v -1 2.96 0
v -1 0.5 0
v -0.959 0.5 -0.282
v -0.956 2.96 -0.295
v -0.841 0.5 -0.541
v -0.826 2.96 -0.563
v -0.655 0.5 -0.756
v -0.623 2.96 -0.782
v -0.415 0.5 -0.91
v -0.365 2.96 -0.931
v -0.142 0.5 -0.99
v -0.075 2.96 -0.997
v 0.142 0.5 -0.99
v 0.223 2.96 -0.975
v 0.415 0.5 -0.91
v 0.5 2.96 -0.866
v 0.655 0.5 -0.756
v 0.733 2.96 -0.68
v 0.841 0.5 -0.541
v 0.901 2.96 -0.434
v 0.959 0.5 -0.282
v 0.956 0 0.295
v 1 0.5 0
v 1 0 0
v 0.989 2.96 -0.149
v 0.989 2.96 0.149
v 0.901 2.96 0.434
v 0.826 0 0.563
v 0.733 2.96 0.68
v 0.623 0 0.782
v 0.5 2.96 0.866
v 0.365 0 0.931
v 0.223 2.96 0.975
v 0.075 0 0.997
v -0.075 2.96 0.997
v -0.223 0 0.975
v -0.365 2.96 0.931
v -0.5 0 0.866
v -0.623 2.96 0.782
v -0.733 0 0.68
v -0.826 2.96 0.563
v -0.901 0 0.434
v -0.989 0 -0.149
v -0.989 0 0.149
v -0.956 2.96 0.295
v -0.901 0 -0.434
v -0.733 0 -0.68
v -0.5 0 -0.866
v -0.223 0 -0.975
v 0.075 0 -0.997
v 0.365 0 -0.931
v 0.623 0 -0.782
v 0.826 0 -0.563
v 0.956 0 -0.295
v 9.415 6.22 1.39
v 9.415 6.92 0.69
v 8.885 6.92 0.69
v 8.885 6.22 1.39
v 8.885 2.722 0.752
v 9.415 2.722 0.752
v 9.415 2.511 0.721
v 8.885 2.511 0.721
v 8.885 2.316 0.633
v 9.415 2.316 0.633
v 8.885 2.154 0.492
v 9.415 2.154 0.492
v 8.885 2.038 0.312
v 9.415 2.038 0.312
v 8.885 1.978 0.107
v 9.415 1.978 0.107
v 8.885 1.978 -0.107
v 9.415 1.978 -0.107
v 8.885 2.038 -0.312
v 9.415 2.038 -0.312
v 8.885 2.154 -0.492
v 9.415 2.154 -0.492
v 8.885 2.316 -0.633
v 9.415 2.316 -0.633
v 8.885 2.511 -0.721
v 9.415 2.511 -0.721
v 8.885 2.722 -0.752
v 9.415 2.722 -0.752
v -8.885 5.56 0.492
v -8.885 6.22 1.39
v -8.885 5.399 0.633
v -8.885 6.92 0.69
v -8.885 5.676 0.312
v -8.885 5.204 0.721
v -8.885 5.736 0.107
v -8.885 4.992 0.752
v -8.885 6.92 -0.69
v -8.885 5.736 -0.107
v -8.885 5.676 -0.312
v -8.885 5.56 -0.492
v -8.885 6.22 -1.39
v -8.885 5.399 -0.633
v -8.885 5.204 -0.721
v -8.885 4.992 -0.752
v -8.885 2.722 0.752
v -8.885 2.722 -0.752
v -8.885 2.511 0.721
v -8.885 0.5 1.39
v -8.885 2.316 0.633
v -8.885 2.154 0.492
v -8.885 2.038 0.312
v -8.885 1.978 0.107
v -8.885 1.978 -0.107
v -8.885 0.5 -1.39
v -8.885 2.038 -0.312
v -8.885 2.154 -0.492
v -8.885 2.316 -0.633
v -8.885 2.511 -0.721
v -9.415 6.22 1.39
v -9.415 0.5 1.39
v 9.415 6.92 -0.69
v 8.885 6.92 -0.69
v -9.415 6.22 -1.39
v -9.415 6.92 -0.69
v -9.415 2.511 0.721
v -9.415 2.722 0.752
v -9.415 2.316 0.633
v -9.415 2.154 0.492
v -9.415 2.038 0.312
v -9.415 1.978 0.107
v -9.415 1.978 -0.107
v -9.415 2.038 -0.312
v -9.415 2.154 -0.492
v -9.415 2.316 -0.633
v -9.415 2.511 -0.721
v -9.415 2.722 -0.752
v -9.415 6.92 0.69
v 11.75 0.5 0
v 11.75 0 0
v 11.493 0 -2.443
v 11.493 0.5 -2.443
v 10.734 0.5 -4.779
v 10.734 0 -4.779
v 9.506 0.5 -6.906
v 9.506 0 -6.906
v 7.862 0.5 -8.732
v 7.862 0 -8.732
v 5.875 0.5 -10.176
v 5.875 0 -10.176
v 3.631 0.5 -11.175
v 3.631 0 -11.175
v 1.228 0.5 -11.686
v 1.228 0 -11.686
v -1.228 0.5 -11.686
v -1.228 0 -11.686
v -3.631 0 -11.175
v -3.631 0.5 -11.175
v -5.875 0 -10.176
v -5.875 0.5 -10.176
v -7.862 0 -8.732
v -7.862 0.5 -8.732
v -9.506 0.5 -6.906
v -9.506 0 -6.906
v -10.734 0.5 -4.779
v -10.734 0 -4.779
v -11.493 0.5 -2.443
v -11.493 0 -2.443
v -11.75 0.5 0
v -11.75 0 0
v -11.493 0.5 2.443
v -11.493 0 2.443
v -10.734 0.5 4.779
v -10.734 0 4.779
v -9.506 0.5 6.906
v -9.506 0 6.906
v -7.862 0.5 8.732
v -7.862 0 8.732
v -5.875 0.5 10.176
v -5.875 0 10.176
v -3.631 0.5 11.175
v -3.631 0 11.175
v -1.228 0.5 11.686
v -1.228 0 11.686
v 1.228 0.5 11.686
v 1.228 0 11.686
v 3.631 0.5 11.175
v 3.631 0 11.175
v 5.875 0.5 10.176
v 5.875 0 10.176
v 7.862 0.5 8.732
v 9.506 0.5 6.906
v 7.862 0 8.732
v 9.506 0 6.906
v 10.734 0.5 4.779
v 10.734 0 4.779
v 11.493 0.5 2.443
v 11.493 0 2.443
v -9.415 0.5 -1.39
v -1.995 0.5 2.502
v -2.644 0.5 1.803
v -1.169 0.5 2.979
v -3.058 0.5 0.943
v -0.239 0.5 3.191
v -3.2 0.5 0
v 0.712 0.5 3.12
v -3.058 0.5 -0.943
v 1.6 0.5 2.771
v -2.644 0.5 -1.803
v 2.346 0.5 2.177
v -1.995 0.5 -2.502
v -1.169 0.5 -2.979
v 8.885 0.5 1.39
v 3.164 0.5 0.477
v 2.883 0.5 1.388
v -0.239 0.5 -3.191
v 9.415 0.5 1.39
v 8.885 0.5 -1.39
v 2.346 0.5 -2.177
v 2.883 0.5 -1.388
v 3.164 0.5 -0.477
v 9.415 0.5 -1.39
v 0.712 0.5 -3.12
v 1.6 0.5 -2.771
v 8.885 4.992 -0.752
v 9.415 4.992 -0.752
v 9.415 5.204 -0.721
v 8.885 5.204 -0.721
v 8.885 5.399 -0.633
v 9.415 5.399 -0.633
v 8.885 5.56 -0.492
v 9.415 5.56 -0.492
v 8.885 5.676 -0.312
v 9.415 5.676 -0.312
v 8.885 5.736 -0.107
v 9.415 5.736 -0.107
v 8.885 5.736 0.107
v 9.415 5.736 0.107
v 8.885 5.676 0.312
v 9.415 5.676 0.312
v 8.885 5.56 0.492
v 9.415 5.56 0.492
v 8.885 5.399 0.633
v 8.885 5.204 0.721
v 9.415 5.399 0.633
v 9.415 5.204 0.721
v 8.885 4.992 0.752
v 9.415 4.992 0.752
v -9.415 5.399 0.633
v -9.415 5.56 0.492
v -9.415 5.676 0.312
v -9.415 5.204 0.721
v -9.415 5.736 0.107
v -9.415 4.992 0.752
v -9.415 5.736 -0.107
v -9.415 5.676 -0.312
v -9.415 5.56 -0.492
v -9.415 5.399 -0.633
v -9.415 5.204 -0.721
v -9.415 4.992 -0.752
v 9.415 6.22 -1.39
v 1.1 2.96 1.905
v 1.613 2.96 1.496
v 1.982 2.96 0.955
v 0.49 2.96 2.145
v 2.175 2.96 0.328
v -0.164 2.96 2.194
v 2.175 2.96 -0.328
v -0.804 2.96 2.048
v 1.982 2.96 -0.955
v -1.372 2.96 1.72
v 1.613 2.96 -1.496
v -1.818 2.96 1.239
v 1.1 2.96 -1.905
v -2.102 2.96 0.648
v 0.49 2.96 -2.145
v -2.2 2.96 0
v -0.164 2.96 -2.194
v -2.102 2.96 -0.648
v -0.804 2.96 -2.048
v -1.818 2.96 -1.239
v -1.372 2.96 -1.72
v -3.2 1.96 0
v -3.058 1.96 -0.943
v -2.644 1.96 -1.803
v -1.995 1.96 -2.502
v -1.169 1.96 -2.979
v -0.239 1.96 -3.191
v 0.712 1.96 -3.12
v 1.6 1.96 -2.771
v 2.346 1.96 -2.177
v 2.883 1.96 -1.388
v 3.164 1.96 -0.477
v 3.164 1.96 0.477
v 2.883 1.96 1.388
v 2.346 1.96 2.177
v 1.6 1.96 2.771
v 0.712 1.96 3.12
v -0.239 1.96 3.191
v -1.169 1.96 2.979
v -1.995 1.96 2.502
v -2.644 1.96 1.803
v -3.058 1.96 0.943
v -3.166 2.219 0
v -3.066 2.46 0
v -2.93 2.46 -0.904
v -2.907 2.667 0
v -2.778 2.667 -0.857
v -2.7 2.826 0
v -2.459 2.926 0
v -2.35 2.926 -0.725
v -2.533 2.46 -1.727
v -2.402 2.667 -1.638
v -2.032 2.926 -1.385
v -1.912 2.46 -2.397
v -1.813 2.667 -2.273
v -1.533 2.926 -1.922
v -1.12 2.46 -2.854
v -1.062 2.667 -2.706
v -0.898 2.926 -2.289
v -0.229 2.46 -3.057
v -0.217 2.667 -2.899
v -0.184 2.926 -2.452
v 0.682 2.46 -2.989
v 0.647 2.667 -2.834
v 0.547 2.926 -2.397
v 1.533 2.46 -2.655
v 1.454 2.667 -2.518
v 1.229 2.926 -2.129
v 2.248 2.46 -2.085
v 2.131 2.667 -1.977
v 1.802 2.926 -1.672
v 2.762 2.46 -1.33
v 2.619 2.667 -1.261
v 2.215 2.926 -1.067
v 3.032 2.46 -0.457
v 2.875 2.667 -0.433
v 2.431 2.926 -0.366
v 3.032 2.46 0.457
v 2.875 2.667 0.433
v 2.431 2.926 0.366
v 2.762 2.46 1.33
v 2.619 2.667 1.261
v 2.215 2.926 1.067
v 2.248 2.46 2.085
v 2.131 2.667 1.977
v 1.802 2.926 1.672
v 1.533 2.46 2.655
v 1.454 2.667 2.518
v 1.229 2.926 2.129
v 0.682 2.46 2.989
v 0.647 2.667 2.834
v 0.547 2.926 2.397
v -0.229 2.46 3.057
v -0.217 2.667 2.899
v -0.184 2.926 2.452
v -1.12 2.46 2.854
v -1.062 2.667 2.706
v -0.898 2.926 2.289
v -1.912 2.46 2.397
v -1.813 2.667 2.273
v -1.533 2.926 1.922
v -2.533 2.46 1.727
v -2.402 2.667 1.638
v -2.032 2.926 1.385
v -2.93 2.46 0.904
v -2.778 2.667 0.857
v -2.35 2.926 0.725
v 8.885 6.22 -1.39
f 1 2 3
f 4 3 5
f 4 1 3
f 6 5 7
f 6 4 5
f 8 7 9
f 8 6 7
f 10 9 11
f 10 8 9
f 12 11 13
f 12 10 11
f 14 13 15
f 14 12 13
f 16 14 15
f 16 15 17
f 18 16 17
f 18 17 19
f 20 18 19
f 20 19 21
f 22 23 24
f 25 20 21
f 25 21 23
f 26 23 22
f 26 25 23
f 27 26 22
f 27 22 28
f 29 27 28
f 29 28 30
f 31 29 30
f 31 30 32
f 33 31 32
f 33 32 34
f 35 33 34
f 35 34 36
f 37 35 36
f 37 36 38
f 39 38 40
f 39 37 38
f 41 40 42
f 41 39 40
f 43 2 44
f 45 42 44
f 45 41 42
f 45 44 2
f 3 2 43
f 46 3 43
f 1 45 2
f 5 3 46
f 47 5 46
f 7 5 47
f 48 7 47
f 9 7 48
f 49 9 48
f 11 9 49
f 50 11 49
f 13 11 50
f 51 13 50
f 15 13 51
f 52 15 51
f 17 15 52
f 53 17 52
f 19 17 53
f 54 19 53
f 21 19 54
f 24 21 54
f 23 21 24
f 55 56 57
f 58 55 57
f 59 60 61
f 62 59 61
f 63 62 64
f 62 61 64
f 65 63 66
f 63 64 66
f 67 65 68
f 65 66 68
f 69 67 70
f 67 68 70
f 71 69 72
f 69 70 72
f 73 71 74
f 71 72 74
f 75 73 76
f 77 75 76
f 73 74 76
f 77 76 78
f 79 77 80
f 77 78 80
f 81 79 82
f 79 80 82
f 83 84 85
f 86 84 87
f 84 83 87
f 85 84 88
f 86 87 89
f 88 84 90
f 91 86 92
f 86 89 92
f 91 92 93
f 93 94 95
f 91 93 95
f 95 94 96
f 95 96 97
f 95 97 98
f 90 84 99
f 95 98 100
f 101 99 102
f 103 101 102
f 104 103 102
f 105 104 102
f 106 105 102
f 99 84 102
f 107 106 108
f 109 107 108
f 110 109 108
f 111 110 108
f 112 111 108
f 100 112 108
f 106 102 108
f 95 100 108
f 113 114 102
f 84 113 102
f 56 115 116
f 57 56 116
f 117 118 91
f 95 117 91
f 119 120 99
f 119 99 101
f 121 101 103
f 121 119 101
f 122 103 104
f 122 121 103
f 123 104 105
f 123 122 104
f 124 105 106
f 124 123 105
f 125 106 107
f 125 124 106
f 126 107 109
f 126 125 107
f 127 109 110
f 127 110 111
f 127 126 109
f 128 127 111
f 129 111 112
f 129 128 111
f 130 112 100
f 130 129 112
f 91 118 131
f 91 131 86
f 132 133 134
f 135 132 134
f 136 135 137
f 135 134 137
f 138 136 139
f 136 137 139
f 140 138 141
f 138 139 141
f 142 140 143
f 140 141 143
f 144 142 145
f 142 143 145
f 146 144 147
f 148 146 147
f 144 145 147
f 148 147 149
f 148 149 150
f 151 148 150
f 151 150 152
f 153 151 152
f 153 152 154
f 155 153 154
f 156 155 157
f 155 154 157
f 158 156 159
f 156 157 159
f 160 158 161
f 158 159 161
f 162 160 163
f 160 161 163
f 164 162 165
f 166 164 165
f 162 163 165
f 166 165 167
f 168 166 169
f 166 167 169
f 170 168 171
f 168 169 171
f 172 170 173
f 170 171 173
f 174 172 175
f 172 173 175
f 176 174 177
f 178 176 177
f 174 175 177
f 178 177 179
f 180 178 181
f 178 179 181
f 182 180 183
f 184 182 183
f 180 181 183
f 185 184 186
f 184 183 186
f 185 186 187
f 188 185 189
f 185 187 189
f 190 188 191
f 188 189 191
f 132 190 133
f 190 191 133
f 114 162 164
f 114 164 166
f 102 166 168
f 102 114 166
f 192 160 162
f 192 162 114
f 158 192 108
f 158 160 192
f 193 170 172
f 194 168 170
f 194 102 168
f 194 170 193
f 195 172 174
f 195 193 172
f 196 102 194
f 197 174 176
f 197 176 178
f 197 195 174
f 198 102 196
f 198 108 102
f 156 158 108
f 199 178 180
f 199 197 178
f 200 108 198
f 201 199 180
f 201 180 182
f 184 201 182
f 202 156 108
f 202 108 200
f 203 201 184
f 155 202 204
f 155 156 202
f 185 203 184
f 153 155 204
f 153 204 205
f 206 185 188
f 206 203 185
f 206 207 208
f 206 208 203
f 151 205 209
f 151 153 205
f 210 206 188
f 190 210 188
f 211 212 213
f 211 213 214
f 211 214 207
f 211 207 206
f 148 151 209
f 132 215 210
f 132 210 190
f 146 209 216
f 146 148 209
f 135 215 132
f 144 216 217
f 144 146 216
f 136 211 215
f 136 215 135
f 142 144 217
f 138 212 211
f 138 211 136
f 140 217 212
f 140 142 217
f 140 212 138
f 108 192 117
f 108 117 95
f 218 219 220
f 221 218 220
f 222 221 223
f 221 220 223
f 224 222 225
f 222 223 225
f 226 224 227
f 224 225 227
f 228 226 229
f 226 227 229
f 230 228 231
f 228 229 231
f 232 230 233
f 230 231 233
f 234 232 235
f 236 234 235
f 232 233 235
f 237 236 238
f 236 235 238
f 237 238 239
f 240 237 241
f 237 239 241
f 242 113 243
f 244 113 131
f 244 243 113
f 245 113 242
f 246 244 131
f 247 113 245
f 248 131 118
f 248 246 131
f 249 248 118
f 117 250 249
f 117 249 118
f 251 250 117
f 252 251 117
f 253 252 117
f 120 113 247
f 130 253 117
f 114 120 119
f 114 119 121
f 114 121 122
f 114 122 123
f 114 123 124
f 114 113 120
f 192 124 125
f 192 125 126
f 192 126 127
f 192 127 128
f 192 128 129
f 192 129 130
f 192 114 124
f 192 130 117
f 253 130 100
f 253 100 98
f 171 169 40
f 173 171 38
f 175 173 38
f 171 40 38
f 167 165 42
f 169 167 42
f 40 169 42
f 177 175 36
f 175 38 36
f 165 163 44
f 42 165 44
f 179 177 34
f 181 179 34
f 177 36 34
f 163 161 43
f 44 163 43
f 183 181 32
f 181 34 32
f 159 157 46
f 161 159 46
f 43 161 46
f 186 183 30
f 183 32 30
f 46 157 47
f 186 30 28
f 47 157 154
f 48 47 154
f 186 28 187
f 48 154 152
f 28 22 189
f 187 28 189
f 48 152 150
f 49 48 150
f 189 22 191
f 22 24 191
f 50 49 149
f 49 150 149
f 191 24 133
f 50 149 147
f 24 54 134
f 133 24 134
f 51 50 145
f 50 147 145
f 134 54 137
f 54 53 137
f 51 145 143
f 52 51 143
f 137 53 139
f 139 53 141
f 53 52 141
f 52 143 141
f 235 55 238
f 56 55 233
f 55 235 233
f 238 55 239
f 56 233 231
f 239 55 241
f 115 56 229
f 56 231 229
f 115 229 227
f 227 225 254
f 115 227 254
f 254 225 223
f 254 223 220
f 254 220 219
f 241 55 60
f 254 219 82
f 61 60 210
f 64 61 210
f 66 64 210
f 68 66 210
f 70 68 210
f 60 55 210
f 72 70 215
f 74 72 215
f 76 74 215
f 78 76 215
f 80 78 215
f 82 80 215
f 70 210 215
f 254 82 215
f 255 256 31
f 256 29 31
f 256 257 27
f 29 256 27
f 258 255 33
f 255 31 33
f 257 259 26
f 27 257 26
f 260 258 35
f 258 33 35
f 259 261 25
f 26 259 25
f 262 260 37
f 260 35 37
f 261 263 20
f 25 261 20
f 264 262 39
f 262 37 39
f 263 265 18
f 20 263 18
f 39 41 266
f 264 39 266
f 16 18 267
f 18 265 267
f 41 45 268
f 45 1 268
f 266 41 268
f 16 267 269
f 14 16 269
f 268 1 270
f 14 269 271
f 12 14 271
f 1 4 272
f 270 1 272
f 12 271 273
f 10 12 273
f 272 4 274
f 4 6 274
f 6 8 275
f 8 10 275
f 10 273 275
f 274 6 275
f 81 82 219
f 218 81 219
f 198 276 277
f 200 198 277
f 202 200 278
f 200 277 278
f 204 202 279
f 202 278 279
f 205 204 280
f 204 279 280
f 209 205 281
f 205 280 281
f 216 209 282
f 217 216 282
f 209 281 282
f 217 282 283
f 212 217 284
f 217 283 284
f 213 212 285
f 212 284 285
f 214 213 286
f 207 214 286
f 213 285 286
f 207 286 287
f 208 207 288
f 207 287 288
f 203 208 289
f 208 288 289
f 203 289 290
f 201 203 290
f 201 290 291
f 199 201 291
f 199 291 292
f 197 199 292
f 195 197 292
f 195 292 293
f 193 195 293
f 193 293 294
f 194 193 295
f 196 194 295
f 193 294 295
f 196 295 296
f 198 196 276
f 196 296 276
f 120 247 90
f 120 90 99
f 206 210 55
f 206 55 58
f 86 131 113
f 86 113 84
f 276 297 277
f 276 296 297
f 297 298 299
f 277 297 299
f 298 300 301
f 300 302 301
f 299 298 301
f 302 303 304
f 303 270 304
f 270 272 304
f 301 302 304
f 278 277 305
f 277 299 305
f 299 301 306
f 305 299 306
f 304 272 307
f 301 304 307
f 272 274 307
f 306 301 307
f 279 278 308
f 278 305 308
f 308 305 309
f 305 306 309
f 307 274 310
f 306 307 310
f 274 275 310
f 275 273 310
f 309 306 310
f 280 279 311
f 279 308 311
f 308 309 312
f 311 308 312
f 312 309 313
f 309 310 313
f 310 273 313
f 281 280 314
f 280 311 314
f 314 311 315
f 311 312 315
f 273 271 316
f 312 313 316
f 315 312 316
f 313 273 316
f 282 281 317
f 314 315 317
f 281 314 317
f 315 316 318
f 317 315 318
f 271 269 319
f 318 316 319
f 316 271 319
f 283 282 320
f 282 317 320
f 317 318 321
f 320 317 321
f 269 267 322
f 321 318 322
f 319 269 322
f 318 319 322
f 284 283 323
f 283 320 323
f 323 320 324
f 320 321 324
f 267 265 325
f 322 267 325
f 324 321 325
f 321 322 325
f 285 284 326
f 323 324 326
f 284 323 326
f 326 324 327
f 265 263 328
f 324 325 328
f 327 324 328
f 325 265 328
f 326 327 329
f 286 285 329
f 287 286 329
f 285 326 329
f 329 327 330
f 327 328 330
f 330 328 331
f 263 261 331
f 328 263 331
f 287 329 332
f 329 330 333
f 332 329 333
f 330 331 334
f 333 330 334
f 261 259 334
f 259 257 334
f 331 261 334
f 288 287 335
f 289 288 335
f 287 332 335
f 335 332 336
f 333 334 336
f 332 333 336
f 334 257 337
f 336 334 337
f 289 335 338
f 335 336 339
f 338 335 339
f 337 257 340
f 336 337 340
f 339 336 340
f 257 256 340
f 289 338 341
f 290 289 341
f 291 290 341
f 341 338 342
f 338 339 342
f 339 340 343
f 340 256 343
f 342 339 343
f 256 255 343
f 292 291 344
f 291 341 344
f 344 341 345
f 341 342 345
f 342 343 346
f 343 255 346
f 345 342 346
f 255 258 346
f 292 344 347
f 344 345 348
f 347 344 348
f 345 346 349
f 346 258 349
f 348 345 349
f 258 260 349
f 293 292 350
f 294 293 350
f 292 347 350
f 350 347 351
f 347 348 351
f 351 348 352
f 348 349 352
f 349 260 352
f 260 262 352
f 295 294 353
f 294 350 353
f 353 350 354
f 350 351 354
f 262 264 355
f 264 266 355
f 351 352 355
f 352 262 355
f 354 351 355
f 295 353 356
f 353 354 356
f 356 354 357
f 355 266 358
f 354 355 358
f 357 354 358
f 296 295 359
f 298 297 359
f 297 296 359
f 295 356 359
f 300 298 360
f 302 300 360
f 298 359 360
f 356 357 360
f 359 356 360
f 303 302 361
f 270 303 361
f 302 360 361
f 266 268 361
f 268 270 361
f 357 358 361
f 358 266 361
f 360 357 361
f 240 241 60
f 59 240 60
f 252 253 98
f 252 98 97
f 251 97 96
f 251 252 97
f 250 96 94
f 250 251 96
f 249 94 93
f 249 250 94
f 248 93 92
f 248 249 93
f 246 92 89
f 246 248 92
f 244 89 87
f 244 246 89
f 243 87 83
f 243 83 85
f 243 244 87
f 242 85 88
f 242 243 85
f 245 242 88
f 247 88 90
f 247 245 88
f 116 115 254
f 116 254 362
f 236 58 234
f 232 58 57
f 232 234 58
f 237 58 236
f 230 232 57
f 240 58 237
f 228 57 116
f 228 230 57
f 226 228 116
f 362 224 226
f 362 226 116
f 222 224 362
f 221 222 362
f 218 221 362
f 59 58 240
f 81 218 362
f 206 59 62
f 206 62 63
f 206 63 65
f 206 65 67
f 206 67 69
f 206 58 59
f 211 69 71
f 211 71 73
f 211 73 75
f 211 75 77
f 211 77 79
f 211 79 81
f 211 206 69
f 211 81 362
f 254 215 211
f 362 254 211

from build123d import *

# Parameters (mm, degrees)
SKETCH_1_R                 = 11.75
SKETCH_1_R_2               = 1
EXTRUDE_1_DEPTH            = 0.5
SKETCH_2_W                 = 0.53
SKETCH_2_H                 = 2.78
EXTRUDE_2_DEPTH            = 6.42
CHAMFER_1_SIZE             = 0.7
CUT_EXTRUDE_1_DEPTH        = 0.53
SKETCH_4_W                 = 2.2
SKETCH_4_H                 = 2.46
FILLET_1_R                 = 1
CHAMFER_1_OF_MIRROR_1_SIZE = 0.7


with BuildPart() as part:
    # 草图1 → 凸台-拉伸1 (new body)
    with BuildSketch(Plane(origin=(0, 0, 0), x_dir=(1, 0, 0), z_dir=(0, 1, 0))):
        Circle(SKETCH_1_R)
        Circle(SKETCH_1_R_2, mode=Mode.SUBTRACT)
    extrude(amount=EXTRUDE_1_DEPTH)

    # 草图2 → 凸台-拉伸2 (add)
    with BuildSketch(Plane(origin=(0, 0.5, 0), x_dir=(1, 0, 0), z_dir=(0, 1, 0))):
        with Locations((-9.15, 0)):
            Rectangle(SKETCH_2_W, SKETCH_2_H)
    extrude_2 = extrude(amount=EXTRUDE_2_DEPTH)

    # 倒角1
    chamfer_1_edges = [part.edges().sort_by_distance(p)[0] for p in [
        (-9.15, 6.92, -1.39),
        (-9.15, 6.92, 1.39),
    ]]
    chamfer(chamfer_1_edges, length=CHAMFER_1_SIZE)

    # 草图3 → 切除-拉伸1 (cut)
    with BuildSketch(Plane.ZY.offset(9.415)):
        with BuildLine():
            Line((0.751927557, 4.991992343), (0.751927557, 2.722407652))
            ThreePointArc((0.751927557, 2.722407652), (0, 1.970480095), (-0.751927557, 2.722407652))
            Line((-0.751927557, 2.722407652), (-0.751927557, 4.991992343))
            ThreePointArc((-0.751927557, 4.991992343), (0, 5.7439199), (0.751927557, 4.991992343))
        make_face()
    cut_extrude_1 = extrude(amount=-CUT_EXTRUDE_1_DEPTH, mode=Mode.SUBTRACT)

    # 草图4 → 旋转1 (revolve)
    with BuildSketch(Plane.XY):
        with Locations((-2.1, 1.73)):
            Rectangle(SKETCH_4_W, SKETCH_4_H)
    revolve(axis=Axis((0, 3.495676189, 0), (0, -1, 0)))

    # 圆角1
    fillet_1_edges = [part.edges().sort_by_distance(p)[0] for p in [
        (3.2, 2.96, 0),
    ]]
    fillet(fillet_1_edges, radius=FILLET_1_R)

    # 镜向1: 凸台-拉伸2, 切除-拉伸1 across plane
    add(extrude_2.mirror(Plane(origin=(0, 0, 0), x_dir=(0, 0, 1), z_dir=(1, 0, 0))))
    add(cut_extrude_1.mirror(Plane(origin=(0, 0, 0), x_dir=(0, 0, 1), z_dir=(1, 0, 0))), mode=Mode.SUBTRACT)

    # 倒角1 of 镜向1
    chamfer_1_of_mirror_1_edges = [part.edges().sort_by_distance(p)[0] for p in [
        (9.15, 6.92, -1.39),
        (9.15, 6.92, 1.39),
    ]]
    chamfer(chamfer_1_of_mirror_1_edges, length=CHAMFER_1_OF_MIRROR_1_SIZE)


solid = part.part
